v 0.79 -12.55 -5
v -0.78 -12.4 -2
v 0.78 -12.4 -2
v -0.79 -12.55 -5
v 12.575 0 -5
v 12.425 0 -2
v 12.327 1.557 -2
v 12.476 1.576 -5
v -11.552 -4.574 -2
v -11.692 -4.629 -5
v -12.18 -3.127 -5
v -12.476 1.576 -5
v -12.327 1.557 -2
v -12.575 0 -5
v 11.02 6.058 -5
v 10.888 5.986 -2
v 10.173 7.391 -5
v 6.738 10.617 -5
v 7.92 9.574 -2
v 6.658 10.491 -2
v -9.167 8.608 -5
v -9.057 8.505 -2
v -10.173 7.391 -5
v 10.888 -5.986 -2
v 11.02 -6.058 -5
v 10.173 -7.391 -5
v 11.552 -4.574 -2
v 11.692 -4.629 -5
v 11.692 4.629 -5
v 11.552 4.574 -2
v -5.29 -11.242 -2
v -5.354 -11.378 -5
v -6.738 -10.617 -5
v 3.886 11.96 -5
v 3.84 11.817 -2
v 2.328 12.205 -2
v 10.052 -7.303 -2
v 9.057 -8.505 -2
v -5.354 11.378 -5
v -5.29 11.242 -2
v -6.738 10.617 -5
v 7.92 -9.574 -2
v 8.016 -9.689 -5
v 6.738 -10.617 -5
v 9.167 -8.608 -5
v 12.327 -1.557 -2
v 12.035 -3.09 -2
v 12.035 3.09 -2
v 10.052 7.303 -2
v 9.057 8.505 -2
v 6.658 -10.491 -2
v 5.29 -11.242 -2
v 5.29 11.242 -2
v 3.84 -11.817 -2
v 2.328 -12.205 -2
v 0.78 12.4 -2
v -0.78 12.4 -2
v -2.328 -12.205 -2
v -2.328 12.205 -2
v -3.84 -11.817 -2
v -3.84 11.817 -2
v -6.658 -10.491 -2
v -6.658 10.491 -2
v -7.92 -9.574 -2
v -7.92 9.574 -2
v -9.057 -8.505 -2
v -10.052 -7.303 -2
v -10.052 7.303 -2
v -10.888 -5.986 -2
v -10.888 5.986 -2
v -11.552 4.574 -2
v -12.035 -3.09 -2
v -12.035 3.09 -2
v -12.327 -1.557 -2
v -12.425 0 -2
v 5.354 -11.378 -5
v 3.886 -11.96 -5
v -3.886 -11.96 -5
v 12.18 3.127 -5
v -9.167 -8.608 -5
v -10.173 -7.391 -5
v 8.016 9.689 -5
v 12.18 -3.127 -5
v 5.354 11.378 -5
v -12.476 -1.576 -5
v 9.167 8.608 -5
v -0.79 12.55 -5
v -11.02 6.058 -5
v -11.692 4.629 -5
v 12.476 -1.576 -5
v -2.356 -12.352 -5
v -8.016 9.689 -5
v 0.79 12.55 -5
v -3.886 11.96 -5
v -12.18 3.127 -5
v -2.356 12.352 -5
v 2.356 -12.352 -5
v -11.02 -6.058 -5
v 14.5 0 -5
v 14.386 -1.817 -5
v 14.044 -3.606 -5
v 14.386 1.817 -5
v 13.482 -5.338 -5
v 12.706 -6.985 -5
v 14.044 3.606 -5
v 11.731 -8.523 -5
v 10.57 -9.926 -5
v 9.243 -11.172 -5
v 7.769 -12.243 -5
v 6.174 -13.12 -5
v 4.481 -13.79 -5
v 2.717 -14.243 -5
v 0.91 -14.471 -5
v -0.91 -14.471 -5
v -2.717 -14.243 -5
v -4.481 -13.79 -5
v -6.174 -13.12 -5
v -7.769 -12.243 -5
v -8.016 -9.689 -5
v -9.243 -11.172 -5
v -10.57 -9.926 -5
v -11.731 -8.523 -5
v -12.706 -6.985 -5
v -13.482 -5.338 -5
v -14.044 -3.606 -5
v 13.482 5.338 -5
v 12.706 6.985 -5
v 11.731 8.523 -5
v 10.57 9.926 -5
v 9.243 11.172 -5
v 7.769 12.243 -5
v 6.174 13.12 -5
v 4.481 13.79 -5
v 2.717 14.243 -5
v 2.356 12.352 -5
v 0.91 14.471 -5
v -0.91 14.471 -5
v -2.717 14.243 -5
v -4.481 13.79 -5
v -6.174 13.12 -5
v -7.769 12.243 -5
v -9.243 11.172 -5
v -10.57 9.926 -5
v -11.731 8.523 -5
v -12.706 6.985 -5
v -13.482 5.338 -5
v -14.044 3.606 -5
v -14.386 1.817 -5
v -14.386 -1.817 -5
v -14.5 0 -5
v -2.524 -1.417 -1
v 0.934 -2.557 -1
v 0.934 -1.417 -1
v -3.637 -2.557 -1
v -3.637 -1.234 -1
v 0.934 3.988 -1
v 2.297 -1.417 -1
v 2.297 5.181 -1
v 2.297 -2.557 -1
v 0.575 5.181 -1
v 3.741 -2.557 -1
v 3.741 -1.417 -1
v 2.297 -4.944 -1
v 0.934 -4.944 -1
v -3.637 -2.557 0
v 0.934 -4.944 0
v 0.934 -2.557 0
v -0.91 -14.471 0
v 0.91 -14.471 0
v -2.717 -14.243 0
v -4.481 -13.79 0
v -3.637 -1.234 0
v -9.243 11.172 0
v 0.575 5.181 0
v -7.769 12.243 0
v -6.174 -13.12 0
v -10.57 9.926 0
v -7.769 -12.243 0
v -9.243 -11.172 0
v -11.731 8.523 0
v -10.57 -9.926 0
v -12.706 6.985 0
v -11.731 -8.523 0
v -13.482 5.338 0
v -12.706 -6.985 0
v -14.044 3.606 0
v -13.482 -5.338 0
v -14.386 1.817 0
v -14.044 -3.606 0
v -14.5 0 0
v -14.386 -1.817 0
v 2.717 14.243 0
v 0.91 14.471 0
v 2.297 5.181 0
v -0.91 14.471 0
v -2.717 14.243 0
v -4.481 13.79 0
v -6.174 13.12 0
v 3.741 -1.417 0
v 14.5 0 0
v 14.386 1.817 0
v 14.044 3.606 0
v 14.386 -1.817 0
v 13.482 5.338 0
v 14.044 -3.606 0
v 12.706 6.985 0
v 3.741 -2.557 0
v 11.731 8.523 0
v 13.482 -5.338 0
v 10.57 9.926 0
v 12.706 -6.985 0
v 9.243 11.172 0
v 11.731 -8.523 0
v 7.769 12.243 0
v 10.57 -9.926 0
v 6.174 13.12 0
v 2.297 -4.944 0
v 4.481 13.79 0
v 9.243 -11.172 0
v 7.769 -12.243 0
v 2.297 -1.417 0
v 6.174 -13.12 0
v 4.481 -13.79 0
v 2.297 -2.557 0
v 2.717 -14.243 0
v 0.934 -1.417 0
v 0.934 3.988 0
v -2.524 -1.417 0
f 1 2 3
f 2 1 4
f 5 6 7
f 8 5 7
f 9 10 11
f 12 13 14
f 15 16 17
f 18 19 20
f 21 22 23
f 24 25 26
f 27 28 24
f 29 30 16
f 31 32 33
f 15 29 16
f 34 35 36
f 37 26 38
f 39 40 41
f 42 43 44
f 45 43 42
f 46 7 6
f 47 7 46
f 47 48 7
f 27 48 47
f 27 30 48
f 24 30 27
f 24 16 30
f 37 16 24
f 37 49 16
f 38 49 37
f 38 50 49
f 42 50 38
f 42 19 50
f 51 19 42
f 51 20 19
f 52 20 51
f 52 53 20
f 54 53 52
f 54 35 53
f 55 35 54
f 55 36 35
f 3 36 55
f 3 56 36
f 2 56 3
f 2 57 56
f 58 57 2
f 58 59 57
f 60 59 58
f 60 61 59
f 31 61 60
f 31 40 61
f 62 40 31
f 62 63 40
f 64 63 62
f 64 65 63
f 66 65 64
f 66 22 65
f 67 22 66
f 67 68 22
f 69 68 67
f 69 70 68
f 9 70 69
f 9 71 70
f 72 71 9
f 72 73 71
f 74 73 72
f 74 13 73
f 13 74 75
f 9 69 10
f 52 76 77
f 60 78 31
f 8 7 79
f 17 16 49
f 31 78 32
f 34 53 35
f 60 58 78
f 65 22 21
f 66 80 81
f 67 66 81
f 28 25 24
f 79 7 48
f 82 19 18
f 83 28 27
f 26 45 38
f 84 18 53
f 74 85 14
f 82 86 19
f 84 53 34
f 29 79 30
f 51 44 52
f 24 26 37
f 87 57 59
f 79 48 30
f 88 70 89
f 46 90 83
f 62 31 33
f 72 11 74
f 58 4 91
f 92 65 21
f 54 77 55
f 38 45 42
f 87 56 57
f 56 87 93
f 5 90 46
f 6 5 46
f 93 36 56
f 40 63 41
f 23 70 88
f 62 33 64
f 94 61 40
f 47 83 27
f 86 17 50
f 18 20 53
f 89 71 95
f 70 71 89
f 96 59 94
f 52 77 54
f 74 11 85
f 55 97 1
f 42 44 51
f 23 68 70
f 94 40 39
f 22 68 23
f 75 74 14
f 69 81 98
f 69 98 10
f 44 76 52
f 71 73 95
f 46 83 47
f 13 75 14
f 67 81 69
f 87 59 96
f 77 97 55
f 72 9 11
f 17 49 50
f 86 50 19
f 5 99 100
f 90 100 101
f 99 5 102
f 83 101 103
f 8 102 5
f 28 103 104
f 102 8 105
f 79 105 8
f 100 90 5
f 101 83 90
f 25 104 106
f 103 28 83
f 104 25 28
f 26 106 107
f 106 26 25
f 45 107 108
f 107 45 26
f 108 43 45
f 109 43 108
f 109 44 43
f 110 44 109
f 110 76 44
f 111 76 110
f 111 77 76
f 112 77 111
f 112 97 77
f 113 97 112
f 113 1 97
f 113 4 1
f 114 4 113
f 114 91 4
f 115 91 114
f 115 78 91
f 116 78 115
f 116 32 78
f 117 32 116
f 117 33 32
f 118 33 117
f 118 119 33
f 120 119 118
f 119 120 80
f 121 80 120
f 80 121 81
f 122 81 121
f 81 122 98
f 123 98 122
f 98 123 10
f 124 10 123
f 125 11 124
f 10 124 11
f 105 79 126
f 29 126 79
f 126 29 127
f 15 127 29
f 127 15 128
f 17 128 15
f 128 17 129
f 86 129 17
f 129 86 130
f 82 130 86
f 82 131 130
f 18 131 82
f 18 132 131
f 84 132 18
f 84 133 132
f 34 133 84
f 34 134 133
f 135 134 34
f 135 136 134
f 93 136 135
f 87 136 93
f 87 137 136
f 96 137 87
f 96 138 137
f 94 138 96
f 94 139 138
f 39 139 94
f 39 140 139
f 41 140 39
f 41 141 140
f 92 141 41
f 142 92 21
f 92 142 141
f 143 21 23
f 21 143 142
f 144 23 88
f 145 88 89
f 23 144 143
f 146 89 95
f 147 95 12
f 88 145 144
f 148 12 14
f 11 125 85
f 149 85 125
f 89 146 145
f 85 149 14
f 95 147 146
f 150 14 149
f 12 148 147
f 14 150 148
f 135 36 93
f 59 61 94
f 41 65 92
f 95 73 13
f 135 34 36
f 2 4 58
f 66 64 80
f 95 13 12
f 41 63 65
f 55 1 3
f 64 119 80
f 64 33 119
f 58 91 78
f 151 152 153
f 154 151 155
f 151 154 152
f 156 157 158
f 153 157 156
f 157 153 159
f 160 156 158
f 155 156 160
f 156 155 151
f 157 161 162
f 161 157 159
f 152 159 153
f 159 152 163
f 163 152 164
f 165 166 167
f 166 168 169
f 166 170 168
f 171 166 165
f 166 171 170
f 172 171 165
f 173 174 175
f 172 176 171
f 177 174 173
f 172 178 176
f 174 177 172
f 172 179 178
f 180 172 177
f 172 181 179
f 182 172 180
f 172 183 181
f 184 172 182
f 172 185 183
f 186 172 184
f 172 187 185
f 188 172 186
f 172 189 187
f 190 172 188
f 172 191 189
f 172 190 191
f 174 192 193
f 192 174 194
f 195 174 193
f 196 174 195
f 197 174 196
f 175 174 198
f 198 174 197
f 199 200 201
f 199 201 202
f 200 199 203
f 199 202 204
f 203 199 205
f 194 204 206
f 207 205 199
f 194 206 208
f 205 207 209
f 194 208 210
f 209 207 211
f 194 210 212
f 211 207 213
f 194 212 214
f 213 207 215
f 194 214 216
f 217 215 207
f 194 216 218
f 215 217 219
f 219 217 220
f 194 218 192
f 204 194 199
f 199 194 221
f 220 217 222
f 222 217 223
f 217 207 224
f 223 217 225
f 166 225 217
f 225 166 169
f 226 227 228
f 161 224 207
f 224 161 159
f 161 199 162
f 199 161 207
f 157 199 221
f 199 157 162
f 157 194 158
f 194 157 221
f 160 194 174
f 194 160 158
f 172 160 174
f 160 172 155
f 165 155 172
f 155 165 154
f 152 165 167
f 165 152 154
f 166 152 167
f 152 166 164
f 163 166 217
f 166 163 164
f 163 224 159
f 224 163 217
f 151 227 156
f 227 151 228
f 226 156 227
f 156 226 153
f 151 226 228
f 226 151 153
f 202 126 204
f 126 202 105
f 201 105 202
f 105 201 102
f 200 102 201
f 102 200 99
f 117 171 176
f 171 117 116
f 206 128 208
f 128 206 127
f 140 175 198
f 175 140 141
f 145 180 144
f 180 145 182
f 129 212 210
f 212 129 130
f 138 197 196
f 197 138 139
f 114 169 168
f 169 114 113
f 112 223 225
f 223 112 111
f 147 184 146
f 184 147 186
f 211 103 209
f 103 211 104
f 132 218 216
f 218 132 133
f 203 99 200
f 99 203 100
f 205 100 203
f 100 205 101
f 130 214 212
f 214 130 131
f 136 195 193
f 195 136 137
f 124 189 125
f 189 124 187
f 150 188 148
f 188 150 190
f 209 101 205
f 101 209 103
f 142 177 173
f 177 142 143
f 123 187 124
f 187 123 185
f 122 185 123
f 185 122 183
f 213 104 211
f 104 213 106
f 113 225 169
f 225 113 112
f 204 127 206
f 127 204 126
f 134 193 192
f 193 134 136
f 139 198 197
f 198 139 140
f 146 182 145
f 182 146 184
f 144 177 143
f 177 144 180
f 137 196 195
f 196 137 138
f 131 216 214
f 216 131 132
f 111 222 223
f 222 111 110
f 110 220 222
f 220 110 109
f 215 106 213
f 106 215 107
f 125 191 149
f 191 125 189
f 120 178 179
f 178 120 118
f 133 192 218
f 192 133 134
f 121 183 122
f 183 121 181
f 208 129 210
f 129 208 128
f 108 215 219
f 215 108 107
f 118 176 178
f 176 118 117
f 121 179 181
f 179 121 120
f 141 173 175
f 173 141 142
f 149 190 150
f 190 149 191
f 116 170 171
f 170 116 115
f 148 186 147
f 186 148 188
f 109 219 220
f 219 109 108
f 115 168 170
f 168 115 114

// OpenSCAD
$fn = 50;

difference() {
	union() {
		translate(v = [0, 0, -5.0]) {
			cylinder(h = 5, r = 14.5);
		}
	}
	union() {
		#translate(v = [0, 0, -5.0]) {
			cylinder(h = 3, r1 = 12.575, r2 = 12.425);
		}
		translate(v = [0, 0, -1]) {
			linear_extrude(height = 1) {
				text(font = "Impact", halign = "center", size = 10, text = "4", valign = "center");
			}
		}
	}
}
